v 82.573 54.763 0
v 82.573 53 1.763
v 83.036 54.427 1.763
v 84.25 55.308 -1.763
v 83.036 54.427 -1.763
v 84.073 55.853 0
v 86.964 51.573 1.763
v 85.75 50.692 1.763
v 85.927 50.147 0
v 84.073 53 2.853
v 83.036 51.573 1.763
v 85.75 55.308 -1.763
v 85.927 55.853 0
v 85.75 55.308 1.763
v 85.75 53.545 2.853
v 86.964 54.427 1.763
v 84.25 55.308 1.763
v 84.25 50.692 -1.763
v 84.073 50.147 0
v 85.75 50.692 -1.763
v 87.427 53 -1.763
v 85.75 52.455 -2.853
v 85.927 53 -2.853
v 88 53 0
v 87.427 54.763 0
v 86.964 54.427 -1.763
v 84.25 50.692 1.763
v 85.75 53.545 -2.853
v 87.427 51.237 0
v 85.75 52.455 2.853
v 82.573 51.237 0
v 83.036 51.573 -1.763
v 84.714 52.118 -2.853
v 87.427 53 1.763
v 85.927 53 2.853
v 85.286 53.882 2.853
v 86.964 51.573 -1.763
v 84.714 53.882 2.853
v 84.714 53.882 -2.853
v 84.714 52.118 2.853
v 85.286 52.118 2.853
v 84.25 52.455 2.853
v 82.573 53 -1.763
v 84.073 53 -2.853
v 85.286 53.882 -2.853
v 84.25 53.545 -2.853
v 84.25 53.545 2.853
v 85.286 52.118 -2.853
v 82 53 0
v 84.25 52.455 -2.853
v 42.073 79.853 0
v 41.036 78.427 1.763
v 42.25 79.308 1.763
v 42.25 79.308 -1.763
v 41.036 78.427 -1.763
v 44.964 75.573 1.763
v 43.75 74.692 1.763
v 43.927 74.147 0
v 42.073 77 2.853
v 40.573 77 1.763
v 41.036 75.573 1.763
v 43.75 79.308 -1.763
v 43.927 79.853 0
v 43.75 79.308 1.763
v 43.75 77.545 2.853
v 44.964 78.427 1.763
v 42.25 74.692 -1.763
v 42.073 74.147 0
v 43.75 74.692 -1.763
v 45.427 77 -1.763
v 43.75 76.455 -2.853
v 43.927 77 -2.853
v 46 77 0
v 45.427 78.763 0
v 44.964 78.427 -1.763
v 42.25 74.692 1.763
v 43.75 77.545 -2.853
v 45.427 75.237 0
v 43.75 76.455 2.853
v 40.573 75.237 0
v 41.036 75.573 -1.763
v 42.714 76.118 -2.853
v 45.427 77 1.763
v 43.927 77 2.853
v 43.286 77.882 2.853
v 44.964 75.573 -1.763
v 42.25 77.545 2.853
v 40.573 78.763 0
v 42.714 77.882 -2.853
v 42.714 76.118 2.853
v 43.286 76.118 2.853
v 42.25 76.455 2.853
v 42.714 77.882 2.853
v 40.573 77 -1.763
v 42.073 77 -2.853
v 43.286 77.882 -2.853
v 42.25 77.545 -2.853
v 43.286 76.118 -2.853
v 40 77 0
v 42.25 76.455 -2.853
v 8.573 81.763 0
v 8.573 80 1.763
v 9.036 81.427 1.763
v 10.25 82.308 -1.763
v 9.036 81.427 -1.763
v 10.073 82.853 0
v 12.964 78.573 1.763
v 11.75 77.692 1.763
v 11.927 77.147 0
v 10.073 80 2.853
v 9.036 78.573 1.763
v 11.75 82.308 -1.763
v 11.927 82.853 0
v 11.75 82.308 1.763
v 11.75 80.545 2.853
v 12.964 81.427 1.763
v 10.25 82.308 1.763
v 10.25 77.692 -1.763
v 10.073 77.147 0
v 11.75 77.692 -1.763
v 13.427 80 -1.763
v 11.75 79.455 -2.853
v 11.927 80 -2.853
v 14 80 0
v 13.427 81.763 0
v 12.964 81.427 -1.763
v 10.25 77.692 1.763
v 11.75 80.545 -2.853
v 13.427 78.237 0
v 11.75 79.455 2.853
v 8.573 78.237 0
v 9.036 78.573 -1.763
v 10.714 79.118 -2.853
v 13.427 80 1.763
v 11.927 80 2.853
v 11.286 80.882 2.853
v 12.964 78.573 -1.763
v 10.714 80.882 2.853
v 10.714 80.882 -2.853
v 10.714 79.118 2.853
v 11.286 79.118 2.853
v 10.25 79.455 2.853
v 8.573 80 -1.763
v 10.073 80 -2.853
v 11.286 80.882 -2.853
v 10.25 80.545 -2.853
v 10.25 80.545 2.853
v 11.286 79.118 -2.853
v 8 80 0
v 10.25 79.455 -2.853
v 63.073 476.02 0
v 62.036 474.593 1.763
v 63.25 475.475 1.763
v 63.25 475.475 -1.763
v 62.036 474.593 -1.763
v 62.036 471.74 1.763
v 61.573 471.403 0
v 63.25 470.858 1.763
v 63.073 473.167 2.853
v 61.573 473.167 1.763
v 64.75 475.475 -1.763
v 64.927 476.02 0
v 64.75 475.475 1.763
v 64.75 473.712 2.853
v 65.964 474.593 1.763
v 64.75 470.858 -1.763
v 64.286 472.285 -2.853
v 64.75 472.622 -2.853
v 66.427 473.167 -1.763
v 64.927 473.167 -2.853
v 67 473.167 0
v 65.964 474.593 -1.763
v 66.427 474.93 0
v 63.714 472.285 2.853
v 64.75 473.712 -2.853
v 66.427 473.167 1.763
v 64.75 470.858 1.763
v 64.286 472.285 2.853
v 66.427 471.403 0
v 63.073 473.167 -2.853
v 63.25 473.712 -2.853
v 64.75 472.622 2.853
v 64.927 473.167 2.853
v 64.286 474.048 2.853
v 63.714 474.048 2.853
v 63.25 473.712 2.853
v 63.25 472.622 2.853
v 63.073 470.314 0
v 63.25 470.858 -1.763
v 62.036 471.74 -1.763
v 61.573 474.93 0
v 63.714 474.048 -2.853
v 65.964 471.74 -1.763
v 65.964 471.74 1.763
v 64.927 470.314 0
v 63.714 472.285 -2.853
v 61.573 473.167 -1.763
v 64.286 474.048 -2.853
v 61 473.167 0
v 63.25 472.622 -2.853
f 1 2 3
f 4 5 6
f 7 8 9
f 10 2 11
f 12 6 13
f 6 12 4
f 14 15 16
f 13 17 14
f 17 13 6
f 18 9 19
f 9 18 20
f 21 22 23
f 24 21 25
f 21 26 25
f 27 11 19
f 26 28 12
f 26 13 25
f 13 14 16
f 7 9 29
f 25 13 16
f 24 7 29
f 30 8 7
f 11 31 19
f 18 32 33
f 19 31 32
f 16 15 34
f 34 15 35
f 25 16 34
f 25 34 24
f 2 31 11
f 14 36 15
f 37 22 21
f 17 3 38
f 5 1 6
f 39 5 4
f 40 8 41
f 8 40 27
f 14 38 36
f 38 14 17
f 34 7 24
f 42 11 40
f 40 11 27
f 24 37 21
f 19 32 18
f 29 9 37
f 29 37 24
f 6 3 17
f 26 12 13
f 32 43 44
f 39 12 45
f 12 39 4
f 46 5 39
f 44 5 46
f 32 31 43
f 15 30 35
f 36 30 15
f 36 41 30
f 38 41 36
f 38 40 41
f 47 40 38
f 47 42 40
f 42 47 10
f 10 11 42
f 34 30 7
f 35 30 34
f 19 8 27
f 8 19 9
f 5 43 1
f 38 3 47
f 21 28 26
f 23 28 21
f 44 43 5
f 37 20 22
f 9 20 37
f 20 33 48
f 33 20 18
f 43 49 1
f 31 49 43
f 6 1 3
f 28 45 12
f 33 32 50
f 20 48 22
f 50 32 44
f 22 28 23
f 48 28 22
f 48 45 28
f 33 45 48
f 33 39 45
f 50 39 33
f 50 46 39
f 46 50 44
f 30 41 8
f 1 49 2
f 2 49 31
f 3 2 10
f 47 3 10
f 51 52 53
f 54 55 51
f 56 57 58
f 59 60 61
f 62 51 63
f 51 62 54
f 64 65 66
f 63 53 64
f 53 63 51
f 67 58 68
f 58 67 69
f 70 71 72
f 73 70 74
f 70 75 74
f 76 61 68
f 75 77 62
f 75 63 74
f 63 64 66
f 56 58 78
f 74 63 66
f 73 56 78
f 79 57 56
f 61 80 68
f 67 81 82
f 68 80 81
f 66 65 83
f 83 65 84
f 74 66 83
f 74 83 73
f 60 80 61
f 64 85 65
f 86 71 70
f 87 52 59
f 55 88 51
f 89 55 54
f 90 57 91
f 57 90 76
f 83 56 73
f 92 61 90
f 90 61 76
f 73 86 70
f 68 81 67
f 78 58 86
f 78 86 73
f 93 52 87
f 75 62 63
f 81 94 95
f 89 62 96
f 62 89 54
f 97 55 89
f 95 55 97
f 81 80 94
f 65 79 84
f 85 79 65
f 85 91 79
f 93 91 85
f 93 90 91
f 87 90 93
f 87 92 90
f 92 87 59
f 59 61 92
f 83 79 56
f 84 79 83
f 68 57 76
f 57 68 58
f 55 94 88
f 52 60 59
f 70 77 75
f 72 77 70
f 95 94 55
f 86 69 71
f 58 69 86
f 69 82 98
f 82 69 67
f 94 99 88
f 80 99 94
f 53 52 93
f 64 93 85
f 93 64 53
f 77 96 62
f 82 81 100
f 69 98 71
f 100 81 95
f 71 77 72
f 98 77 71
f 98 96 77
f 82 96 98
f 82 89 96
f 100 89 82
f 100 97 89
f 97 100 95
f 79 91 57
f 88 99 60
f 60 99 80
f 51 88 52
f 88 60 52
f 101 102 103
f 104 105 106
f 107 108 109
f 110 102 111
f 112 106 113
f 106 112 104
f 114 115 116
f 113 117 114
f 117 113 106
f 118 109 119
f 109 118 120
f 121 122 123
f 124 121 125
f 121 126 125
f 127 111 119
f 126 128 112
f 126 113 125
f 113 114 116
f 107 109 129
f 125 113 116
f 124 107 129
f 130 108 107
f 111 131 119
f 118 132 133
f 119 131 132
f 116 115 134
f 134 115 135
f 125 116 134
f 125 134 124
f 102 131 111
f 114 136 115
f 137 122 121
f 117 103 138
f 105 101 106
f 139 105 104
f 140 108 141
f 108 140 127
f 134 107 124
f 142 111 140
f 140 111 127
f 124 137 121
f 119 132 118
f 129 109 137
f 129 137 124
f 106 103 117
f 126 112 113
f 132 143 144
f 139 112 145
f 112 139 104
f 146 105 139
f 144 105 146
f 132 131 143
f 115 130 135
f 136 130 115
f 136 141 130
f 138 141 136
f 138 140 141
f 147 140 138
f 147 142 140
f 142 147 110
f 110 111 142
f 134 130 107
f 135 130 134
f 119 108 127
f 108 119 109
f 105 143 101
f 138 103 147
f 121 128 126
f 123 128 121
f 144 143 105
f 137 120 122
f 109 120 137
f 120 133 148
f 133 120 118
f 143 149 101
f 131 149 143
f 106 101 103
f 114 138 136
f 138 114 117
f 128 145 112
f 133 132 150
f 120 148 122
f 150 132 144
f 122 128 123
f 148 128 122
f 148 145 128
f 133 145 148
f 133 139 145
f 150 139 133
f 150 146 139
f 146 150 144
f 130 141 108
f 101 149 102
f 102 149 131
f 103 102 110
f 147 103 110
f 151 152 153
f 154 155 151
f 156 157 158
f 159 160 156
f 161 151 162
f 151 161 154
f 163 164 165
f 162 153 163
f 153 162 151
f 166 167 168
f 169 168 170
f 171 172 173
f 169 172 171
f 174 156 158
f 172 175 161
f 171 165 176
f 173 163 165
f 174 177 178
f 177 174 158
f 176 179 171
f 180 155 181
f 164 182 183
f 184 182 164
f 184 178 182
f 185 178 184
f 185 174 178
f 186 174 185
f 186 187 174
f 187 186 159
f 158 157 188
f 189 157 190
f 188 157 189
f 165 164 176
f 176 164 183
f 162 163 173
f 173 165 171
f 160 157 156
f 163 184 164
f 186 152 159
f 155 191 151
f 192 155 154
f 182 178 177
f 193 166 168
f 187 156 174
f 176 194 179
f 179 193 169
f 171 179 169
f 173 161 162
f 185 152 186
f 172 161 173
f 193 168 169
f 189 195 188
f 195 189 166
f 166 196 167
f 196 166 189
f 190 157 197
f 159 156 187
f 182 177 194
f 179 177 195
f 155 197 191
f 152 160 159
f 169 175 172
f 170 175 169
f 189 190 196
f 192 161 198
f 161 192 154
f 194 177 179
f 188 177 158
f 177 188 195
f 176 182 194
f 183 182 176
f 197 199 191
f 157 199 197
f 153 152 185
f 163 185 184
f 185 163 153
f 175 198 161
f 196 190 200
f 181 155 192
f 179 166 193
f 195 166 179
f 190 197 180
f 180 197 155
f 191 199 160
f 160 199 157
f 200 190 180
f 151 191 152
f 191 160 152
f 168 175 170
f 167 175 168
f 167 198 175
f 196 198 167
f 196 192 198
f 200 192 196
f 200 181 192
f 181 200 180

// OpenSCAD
// Super Triangle 



// circular linked list 

/*
input: three points
output: one circumcenter
*/

//有兩種linked_list
//---------------------------------------------------
function next_node(index,init_num,count_num,array)=
     let(head=0)
     let(end=len(array)-1)
     count_num>=index? init_num:
     init_num==end?
     next_node(index,head,count_num+1,array):  
     next_node(index,init_num+1,count_num+1,array);
     
function linked_list(index,array)=
     let(init_num=0)
     let(count_num=0) 
     next_node(index,init_num,count_num,array);
//---------------------------------------------------     
function next_node_(index,init_num,count_num,array)=
     let(head=len(array)-1)
     let(end=0)
     count_num>=index? init_num:
     init_num==end?
     next_node_(index,head,count_num+1,array):
     next_node_(index,init_num-1,count_num+1,array);
     
function linked_list_(index,array)=
     let(init_num=len(array)-1)
     let(count_num=0)
     next_node_(index,init_num,count_num,array);
     
//--------------------------------------------------    
function list(init_num,array)=
       let(index=0)
       let(num=array[index][linked_list(init_num,array)])
       list_inner(index+1,init_num+1,num,array);    
function list_inner(index,init_num,num,array)=     
       let(leng=len(array))
       index==leng?num:
       let(num_=num*array[index][linked_list(init_num,array)])
       list_inner(index+1,init_num+1,num_,array);

//------------------------------------------------------------------
function list_(init_num,array)=
      let(index=0)
      let(num=array[index][linked_list_(init_num,array)])
      list_inner_(index+1,init_num+1,num,array);
function list_inner_(index,init_num,num,array)=
      let(leng=len(array))
      index==leng?num:
      let(num_=num*array[index][linked_list_(init_num,array)]) 
      list_inner_(index+1,init_num+1,num_,array);
      
    
//--------------------------------------------------------------------        
function sum(list)=
      let(leng=len(list))
      leng==1?list[0]:
      leng==2?list[0]+list[1]:
      let( 
          sum_first=list[0]+list[1],
          sum_after=[for(i=[2:leng-1])
              list[i]])    
      sum(concat(sum_first,sum_after));
          

function determinant(array)=
     let(stairs=len(array)-1)
     let(sum1=sum([for(i=[0:stairs]) list(i,array)]))
     let(sum2=sum([for(i=[0:stairs])list_(i,array)]))
    sum1-sum2; 
    
    
function circumcenter(p1,p2,p3)=
      let(x1=p1.x,y1=p2.y,x2=p2.x,y2=p2.y,x3=p3.x,y3=p3.y)
      let(x=determinant([[pow(x1,2)+pow(y1,2),y1,1],
                    [pow(x2,2)+pow(y2,2),y2,1],
                    [pow(x3,2)+pow(y3,2),y3,1]])/(2*
        determinant([[x1,y1,1],
                     [x2,y2,1],
                     [x3,y3,1]]))     
         )
      let(y=determinant([[x1,pow(x1,2)+pow(y1,2),1],
                         [x2,pow(x2,2)+pow(y2,2),1],
                         [x3,pow(x3,2)+pow(y3,2),1] 
                         ])/(2*
            determinant([[x1,y1,1],
                         [x2,y2,1],
                         [x3,y3,1]])))
      [x,y];
     


init_value=0;
end_value=100;
points_num=100;

function rnd_v(init_value,end_value)=round(rands(init_value,end_value,1)[0]);
     

p1=[rnd_v(init_value,end_value),rnd_v(init_value,end_value)];
p2=[rnd_v(init_value,end_value),rnd_v(init_value,end_value)];
p3=[rnd_v(init_value,end_value),rnd_v(init_value,end_value)];

c=circumcenter(p1,p2,p3);

points=[p1,p2,p3];
for(i=points)
   translate(i)
      sphere(3);

translate(c)
    color("red")
       sphere(3);
      
      

















   
      
      
       
       
       
       
       
       
       
     
